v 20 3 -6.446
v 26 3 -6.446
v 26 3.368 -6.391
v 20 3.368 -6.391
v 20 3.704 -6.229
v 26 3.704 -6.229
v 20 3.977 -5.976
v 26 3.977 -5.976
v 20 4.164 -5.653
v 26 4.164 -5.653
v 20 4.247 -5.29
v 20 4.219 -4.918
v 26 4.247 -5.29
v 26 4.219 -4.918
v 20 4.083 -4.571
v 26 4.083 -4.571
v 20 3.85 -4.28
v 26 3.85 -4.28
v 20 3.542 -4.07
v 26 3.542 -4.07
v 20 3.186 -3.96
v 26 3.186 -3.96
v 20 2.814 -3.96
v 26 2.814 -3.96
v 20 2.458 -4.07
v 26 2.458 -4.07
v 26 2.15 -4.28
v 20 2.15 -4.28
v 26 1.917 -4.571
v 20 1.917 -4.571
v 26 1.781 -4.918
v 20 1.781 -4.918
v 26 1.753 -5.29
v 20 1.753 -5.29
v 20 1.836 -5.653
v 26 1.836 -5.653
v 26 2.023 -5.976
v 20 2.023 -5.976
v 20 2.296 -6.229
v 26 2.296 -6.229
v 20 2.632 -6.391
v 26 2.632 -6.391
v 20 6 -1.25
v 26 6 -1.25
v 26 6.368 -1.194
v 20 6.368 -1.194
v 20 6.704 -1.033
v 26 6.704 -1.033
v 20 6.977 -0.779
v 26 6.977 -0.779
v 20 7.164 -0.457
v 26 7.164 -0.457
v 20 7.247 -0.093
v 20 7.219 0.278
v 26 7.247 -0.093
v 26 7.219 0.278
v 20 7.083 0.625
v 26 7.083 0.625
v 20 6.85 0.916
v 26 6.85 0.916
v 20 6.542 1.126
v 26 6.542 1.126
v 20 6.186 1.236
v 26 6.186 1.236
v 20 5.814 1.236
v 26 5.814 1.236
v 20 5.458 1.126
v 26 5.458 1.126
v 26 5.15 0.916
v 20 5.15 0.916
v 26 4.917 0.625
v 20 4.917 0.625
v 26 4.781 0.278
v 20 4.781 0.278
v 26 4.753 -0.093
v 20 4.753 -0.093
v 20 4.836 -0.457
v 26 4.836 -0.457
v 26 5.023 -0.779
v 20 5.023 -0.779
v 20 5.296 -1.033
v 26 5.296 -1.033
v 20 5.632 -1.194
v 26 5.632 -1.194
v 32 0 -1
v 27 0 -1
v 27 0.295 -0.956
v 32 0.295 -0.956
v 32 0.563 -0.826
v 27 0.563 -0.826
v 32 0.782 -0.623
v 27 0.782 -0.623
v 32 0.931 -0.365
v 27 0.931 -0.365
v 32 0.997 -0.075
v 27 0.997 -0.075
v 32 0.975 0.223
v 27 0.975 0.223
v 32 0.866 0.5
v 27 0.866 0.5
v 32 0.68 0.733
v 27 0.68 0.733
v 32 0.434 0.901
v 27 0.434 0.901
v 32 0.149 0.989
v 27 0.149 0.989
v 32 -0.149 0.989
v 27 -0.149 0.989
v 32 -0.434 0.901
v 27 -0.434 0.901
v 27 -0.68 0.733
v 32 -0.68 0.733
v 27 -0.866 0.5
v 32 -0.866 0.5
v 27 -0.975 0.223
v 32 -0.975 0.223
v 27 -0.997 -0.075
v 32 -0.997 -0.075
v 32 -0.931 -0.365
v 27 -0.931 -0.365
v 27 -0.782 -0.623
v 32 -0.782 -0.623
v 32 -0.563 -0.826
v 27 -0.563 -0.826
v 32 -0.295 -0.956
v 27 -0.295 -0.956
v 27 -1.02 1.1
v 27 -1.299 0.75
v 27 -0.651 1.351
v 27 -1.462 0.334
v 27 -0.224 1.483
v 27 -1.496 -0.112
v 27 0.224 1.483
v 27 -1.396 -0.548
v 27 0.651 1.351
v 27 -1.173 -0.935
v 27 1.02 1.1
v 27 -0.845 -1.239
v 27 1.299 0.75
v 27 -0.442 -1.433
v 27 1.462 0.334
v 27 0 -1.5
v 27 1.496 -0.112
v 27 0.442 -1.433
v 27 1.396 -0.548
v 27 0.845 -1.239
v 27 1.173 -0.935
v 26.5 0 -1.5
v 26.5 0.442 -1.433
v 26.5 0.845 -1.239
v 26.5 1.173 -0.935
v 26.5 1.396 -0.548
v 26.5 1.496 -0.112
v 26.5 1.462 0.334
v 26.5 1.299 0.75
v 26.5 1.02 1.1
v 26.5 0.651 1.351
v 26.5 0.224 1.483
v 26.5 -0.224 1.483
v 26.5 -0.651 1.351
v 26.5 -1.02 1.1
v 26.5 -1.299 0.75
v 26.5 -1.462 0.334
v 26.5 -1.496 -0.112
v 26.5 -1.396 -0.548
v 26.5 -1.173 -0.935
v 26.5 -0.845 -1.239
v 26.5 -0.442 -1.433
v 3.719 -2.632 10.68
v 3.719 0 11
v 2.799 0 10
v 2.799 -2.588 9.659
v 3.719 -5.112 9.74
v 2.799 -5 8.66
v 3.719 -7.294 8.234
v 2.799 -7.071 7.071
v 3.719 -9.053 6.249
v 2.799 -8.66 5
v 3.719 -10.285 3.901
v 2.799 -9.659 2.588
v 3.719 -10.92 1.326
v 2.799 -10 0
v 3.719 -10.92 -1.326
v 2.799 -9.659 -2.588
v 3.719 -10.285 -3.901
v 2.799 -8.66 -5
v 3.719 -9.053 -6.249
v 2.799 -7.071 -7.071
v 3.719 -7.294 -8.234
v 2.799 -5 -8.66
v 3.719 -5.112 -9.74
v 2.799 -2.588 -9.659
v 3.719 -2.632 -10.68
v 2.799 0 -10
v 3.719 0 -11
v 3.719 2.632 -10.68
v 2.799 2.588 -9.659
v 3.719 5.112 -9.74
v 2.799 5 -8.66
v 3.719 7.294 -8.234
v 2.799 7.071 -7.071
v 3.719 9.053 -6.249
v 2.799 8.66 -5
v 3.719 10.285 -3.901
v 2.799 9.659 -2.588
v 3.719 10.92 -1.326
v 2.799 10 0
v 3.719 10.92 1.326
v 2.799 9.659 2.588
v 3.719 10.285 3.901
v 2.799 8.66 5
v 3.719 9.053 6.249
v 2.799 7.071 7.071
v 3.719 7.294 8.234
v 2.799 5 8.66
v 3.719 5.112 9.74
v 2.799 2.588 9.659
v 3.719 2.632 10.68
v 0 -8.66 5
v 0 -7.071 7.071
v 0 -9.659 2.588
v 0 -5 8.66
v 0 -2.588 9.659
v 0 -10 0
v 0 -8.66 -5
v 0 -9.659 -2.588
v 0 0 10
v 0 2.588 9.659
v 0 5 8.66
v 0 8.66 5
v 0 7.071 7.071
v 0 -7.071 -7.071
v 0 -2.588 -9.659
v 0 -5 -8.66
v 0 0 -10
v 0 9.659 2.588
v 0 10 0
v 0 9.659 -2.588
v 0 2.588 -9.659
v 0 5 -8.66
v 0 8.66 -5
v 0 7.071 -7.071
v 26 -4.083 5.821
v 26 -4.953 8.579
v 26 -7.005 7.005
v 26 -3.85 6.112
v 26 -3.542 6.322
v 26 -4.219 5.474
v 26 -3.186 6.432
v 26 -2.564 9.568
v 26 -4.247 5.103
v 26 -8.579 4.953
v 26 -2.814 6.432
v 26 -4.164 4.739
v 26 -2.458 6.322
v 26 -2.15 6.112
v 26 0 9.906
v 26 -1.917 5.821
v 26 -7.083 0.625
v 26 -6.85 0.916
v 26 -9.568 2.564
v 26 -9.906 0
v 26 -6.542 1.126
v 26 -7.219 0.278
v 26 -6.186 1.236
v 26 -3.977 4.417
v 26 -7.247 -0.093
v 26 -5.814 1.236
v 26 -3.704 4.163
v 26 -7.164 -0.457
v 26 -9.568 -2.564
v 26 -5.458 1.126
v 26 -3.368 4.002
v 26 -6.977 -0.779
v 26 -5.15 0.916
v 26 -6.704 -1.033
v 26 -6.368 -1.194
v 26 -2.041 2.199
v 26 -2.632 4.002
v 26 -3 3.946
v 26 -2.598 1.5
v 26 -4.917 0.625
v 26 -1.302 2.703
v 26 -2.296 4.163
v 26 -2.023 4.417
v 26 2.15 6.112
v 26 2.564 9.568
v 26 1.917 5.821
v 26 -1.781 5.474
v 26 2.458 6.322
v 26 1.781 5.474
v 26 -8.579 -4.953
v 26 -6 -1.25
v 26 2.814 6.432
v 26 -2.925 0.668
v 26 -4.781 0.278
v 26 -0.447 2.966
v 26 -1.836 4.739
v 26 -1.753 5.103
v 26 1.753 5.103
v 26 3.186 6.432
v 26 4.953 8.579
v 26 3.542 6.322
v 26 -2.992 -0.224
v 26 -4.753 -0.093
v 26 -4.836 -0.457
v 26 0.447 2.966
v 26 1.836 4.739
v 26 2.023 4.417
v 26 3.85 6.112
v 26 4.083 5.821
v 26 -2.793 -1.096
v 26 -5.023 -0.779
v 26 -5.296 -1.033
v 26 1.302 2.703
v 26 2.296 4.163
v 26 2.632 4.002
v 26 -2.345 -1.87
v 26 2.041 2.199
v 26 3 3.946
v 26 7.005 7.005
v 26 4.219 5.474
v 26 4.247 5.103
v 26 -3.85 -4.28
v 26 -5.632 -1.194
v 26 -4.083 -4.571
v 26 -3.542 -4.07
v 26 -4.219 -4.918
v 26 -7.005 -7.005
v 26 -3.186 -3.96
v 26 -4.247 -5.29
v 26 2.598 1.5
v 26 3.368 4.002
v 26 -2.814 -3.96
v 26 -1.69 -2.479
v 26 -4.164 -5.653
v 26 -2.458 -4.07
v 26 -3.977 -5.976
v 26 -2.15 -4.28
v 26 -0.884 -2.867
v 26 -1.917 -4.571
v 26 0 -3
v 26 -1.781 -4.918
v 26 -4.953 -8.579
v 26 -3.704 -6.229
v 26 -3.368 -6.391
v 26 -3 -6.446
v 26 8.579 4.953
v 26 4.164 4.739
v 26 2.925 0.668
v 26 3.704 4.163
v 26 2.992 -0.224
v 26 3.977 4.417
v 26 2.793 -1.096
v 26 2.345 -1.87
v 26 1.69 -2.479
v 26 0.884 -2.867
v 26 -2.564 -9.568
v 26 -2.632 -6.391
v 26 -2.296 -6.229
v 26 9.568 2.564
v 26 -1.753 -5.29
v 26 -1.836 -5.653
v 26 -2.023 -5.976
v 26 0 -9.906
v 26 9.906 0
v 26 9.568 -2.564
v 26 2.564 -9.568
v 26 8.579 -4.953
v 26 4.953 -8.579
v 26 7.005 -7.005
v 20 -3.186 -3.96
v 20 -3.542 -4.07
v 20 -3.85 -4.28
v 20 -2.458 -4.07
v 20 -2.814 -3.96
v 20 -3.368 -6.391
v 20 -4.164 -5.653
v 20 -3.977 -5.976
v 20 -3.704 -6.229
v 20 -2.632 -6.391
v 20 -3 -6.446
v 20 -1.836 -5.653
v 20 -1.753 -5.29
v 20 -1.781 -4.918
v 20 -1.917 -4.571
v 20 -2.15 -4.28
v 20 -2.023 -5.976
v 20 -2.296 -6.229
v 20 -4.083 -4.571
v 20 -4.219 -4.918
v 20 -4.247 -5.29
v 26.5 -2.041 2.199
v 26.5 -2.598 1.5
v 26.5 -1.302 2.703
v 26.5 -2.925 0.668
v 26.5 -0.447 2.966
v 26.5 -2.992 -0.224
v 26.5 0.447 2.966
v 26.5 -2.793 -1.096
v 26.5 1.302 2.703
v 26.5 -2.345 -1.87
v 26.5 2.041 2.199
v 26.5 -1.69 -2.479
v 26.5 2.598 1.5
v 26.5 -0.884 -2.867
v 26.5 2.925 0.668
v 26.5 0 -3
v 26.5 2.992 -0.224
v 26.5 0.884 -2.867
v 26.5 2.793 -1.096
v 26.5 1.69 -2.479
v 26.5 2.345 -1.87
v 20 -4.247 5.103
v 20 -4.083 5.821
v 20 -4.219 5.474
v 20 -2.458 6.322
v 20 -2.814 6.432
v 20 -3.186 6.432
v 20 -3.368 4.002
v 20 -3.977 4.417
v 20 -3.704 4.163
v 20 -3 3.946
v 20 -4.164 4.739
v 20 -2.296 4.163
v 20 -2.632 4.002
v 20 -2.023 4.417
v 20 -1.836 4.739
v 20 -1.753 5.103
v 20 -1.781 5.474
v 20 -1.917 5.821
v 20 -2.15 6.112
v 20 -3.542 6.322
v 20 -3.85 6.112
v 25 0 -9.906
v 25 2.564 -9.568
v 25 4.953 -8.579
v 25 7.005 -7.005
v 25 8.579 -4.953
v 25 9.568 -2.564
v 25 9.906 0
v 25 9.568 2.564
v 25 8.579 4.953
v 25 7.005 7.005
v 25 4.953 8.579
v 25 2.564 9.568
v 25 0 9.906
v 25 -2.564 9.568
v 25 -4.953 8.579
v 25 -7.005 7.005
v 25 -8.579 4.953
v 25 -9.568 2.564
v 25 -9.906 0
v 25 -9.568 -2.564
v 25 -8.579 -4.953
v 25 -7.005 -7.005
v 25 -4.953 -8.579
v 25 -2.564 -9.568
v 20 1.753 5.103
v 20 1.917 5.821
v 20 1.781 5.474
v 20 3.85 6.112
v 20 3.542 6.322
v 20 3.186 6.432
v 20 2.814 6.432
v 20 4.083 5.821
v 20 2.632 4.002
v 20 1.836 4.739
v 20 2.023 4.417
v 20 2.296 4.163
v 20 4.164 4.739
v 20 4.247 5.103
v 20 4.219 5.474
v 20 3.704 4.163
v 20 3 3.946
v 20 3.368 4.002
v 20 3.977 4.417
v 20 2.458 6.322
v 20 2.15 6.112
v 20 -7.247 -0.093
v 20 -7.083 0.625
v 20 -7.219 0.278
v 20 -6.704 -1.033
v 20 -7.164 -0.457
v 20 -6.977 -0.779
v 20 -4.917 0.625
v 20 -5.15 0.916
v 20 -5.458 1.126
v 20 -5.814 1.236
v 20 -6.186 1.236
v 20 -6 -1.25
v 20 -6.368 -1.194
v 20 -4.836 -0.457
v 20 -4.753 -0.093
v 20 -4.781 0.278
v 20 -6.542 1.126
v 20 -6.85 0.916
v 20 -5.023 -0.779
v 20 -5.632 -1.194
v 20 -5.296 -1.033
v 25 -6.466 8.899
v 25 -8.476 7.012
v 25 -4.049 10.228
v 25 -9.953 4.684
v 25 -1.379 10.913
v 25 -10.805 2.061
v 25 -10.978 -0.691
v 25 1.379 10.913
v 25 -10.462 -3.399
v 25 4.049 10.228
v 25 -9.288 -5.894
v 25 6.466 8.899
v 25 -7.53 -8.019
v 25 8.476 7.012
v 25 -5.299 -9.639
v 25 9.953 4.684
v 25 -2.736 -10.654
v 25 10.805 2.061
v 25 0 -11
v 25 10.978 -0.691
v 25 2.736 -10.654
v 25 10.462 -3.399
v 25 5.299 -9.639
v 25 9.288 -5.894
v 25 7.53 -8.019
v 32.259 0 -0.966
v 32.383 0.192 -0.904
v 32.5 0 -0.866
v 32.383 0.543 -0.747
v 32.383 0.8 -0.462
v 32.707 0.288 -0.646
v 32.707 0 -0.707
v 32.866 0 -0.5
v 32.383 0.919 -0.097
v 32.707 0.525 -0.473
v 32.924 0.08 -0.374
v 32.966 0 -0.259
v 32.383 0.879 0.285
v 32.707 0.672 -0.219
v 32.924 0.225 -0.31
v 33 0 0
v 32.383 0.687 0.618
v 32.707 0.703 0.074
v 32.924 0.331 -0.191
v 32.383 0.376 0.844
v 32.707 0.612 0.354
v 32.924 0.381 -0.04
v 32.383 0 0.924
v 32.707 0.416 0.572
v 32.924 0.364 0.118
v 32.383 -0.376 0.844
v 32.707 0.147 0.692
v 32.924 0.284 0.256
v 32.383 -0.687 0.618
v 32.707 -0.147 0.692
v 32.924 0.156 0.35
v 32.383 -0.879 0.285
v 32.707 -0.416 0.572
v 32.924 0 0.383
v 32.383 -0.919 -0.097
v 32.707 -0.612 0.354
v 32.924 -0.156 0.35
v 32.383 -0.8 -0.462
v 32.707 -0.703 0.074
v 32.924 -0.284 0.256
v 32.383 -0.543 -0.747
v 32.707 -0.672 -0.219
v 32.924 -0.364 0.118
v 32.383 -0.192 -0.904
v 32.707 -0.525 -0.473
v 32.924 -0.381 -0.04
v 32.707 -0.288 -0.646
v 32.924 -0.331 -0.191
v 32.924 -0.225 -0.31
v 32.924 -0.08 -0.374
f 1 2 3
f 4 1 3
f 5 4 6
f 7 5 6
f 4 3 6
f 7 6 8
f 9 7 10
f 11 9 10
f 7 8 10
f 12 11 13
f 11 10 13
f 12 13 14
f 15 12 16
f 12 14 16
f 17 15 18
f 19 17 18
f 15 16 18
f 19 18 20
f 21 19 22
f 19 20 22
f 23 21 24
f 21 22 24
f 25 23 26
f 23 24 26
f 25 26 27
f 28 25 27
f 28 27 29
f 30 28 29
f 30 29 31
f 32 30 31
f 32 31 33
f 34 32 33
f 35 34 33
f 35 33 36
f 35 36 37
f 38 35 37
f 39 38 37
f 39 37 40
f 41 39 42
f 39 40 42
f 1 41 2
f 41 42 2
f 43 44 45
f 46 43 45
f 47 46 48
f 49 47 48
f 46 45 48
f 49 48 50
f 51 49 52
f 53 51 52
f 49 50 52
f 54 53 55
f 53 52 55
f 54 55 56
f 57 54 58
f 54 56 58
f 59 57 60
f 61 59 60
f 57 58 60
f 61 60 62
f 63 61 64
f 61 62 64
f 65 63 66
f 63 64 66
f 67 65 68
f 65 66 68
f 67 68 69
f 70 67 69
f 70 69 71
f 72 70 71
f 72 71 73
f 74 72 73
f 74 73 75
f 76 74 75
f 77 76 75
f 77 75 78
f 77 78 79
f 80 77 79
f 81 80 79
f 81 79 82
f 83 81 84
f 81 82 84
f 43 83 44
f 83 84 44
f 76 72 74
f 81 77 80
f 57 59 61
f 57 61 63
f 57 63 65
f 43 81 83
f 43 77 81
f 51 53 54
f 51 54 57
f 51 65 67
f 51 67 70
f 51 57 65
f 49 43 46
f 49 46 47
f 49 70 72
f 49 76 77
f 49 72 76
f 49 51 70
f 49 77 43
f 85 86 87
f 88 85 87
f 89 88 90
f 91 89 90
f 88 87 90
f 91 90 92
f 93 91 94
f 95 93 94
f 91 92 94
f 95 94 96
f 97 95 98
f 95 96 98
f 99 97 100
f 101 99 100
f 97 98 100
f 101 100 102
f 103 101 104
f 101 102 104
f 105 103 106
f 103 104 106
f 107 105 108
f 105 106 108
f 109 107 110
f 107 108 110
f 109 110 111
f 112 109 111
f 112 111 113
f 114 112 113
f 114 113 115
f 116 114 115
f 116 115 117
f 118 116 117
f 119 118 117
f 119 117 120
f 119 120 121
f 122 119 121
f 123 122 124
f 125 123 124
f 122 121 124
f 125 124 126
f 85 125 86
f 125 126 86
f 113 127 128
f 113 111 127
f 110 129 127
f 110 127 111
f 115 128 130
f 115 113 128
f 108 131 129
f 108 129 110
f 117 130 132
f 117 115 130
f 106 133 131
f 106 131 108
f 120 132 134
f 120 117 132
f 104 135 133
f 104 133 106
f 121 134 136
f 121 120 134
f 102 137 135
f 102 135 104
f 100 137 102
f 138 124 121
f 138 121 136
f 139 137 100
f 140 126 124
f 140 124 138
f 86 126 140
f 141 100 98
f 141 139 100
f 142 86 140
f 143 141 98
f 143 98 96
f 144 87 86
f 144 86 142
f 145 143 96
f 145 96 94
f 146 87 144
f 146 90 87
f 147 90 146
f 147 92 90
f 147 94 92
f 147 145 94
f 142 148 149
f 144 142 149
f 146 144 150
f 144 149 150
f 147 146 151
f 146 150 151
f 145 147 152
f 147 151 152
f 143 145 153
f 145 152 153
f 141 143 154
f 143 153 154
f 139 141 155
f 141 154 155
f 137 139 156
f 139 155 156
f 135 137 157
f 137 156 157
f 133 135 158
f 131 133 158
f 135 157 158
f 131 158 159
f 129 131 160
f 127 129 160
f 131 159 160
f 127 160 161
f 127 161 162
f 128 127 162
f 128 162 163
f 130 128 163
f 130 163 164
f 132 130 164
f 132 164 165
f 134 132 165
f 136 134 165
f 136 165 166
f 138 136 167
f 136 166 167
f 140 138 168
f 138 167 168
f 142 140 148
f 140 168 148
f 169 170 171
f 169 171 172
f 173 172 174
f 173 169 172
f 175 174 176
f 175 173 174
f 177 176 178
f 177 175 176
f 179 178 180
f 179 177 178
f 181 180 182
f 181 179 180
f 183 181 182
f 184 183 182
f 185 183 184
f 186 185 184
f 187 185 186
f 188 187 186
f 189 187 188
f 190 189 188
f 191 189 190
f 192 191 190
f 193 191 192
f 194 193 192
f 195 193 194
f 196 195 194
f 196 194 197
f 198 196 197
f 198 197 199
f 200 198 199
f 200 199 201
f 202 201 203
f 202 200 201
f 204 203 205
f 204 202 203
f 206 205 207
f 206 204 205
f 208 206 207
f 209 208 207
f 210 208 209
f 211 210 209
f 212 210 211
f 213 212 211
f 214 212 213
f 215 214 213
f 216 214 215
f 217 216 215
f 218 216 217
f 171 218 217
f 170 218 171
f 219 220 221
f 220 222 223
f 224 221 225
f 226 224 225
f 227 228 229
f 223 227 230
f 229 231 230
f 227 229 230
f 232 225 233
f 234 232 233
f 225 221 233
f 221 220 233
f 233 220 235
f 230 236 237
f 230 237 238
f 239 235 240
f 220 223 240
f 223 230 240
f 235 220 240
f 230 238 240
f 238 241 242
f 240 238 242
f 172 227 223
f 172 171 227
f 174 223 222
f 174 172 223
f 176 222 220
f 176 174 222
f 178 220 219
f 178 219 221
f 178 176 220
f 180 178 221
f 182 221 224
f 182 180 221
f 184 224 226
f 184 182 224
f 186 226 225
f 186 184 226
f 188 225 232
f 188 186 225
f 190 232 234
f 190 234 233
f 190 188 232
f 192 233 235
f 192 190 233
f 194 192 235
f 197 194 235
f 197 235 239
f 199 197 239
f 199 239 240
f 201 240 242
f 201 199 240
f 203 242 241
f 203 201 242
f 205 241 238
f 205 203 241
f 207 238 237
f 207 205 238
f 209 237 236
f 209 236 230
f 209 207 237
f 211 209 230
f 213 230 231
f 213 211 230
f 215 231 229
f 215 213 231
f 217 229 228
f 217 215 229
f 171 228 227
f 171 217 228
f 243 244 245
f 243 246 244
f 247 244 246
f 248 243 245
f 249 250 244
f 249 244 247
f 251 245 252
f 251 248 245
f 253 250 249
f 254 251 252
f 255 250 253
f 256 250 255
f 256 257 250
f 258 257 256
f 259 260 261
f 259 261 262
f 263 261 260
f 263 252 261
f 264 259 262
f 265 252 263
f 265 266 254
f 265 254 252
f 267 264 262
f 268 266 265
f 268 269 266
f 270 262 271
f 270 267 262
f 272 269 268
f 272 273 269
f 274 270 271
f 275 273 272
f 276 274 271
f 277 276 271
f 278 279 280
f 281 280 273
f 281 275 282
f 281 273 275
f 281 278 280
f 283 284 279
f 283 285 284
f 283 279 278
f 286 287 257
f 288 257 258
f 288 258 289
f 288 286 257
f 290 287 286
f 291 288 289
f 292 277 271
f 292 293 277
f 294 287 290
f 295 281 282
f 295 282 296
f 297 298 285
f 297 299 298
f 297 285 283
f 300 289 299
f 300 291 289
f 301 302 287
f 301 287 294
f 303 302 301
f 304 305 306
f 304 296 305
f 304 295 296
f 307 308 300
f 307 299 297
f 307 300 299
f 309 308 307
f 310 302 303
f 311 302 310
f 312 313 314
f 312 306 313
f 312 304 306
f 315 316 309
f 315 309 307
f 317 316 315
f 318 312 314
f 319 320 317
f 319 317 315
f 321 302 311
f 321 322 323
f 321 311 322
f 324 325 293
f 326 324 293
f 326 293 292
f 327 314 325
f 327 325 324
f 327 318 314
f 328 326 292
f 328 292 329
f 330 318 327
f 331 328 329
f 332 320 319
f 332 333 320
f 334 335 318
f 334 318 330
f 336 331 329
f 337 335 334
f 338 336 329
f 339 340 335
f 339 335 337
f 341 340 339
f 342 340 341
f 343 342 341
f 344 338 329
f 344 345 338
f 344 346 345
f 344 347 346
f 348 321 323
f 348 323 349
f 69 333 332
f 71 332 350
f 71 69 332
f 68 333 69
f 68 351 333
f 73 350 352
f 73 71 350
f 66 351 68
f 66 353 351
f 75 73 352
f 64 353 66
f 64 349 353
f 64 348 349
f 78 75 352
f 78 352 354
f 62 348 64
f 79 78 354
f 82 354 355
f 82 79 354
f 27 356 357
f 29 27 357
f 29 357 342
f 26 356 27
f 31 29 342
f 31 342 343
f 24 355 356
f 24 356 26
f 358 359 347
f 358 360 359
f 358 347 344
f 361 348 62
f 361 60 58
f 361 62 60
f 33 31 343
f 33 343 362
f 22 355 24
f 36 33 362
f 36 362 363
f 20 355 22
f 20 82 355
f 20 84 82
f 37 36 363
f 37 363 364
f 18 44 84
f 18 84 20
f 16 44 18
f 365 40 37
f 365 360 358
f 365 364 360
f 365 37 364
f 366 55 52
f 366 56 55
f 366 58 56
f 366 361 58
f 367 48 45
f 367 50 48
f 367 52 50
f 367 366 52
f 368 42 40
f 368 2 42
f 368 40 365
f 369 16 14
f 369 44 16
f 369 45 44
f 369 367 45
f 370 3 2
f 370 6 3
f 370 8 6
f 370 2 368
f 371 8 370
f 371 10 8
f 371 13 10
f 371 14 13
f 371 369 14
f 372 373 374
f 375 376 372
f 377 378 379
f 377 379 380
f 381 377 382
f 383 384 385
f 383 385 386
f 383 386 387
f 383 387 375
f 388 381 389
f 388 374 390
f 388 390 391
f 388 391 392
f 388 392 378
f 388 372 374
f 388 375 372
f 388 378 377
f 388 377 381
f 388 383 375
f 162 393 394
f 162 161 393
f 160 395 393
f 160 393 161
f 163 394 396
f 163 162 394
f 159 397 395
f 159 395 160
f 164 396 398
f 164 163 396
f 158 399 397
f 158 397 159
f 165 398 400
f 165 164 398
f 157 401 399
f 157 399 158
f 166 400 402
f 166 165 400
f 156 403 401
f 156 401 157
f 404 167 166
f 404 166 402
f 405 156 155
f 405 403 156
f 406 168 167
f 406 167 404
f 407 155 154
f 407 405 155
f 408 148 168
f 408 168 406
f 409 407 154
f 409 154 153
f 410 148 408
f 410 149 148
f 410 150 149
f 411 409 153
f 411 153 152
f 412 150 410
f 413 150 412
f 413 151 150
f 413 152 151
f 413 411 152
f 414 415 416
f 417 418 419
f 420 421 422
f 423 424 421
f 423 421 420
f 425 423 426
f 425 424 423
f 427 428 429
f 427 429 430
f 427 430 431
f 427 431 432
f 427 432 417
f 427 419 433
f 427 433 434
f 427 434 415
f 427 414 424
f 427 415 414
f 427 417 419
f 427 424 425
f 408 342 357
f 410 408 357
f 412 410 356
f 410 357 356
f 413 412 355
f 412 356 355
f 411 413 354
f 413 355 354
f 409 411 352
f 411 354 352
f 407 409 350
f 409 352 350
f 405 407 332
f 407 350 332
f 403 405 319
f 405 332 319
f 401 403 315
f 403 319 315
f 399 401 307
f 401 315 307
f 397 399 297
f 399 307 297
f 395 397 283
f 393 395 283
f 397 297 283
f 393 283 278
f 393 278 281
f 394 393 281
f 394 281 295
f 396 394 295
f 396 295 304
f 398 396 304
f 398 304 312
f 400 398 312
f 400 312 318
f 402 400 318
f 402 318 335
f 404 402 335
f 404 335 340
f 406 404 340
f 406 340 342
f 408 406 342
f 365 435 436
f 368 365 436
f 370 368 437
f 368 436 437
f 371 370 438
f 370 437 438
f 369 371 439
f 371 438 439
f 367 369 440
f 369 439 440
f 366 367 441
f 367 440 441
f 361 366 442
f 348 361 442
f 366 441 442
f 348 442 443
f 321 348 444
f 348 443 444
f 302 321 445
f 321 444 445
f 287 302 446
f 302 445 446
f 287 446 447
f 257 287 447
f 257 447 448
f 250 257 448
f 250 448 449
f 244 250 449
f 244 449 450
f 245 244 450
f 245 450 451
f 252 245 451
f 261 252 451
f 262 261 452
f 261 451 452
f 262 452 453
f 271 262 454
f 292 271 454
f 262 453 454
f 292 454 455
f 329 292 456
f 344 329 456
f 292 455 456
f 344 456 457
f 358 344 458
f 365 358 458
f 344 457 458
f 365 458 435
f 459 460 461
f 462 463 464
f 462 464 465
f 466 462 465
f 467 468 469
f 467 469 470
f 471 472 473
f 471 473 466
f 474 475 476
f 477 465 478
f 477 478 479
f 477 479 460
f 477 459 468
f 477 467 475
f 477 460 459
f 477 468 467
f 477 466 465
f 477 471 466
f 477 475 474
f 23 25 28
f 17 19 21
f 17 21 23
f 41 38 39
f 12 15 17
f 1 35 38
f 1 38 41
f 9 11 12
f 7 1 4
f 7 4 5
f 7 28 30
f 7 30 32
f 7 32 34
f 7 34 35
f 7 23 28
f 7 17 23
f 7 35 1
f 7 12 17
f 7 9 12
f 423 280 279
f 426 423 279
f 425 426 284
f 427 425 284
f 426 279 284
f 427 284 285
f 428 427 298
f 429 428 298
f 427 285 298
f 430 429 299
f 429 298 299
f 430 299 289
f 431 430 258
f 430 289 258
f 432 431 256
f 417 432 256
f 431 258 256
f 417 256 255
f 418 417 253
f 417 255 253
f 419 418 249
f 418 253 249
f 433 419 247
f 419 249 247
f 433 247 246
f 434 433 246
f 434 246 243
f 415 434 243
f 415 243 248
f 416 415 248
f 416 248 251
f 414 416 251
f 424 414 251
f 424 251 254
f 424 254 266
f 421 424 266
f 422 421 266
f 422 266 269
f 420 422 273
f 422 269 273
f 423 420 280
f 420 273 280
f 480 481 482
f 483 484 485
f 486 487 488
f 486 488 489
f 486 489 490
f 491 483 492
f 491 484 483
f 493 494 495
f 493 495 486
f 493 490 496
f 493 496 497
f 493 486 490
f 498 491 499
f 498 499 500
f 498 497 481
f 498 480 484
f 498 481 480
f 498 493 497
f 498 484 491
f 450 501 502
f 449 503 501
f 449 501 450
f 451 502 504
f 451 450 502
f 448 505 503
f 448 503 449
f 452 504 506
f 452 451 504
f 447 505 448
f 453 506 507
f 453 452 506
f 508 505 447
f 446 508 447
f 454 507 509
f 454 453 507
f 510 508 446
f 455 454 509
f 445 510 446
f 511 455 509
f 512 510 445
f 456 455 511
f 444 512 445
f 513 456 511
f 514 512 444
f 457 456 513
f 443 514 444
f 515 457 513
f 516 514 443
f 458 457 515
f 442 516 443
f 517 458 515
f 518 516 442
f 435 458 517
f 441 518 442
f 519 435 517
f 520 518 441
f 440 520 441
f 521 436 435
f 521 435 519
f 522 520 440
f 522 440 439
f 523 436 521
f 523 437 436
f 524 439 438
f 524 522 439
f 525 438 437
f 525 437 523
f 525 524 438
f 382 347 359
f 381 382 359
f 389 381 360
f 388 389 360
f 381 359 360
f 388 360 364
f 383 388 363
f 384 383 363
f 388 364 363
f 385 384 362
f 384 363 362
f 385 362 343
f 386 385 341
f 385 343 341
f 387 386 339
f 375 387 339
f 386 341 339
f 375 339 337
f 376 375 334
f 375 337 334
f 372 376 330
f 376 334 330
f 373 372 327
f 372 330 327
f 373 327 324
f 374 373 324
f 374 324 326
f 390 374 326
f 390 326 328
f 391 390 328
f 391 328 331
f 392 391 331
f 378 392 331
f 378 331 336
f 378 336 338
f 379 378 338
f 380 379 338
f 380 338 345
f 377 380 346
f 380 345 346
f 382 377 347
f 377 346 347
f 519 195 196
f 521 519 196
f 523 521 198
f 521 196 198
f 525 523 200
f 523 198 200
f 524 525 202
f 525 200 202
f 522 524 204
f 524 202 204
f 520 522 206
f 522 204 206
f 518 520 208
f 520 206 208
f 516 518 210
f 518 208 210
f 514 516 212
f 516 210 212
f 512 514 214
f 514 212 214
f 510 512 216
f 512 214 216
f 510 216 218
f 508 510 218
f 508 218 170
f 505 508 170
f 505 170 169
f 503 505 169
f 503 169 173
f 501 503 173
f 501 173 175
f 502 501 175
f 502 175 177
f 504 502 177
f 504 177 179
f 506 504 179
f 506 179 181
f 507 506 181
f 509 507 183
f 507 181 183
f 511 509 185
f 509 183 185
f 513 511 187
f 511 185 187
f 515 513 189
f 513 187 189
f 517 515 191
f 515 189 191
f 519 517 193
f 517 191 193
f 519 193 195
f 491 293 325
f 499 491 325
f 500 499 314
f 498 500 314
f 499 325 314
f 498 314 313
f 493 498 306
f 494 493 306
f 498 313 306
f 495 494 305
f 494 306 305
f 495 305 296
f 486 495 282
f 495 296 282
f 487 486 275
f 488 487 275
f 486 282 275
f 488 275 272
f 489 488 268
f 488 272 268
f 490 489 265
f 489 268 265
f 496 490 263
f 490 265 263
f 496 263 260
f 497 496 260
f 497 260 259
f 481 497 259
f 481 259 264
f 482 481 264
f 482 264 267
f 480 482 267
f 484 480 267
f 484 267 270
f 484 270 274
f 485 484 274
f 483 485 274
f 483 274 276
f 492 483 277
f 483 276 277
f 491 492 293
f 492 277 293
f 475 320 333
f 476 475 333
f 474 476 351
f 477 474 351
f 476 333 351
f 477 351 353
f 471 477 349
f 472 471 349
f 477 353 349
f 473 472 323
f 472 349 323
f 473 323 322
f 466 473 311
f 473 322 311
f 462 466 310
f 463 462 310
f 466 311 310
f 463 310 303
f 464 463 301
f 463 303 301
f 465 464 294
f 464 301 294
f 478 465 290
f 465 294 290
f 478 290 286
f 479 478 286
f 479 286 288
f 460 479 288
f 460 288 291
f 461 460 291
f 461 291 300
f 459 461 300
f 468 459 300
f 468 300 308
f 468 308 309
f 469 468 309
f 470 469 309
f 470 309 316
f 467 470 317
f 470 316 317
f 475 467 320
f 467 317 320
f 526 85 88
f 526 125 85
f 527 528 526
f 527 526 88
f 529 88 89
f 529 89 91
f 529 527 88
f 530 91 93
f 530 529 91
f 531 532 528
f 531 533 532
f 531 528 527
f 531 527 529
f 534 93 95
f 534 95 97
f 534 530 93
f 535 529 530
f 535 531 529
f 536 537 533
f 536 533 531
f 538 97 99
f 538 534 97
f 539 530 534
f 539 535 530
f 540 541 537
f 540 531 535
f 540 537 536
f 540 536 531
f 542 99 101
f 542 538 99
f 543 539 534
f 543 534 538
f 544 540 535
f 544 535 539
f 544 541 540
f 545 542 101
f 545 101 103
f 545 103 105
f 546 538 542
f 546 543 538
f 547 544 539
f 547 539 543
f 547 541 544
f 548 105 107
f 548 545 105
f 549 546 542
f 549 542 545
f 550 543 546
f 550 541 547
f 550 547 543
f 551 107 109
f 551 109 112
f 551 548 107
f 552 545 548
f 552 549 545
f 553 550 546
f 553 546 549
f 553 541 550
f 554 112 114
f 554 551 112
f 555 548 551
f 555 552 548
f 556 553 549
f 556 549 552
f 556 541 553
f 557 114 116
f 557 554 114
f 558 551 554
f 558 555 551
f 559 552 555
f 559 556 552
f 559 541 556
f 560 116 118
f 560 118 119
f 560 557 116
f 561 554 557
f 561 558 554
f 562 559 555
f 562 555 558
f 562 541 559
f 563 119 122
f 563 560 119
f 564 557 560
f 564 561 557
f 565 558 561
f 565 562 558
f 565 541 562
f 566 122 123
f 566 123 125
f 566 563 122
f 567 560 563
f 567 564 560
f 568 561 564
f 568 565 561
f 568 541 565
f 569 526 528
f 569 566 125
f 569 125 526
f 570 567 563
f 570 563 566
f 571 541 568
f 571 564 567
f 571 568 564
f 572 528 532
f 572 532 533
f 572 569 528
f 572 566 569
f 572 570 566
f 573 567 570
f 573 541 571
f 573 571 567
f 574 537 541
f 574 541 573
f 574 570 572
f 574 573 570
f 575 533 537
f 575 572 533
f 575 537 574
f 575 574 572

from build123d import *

# Parameters (mm, degrees)
CROQUIS4_R              = 11
SALIENTE_EXTRUIR2_DEPTH = 25
CROQUIS5_R              = 3
SALIENTE_EXTRUIR3_DEPTH = 1.5
CROQUIS6_R              = 1.5
SALIENTE_EXTRUIR4_DEPTH = 0.5
CROQUIS7_R              = 1
SALIENTE_EXTRUIR5_DEPTH = 6
REDONDEO1_R             = 1
CROQUIS10_R             = 9.905946753
SALIENTE_EXTRUIR6_DEPTH = 1
CORTAR_EXTRUIR1_START   = 1
CROQUIS8_R              = 1.25
CORTAR_EXTRUIR1_DEPTH   = 6


with BuildPart() as part:
    # Croquis4 → Saliente-Extruir2 (new body)
    with BuildSketch(Plane(origin=(0, 0, 0), x_dir=(0, 0, -1), z_dir=(1, 0, 0))):
        Circle(CROQUIS4_R)
    extrude(amount=SALIENTE_EXTRUIR2_DEPTH)

    # Croquis5 → Saliente-Extruir3 (add)
    with BuildSketch(Plane(origin=(25, 0, 0), x_dir=(0, 0, -1), z_dir=(1, 0, 0))):
        Circle(CROQUIS5_R)
    extrude(amount=SALIENTE_EXTRUIR3_DEPTH)

    # Croquis6 → Saliente-Extruir4 (add)
    with BuildSketch(Plane(origin=(26.5, 0, 0), x_dir=(0, 0, -1), z_dir=(1, 0, 0))):
        Circle(CROQUIS6_R)
    extrude(amount=SALIENTE_EXTRUIR4_DEPTH)

    # Croquis7 → Saliente-Extruir5 (add)
    with BuildSketch(Plane(origin=(27, 0, 0), x_dir=(0, 0, -1), z_dir=(1, 0, 0))):
        Circle(CROQUIS7_R)
    extrude(amount=SALIENTE_EXTRUIR5_DEPTH)

    # Redondeo1
    redondeo1_edges = [part.edges().sort_by_distance(p)[0] for p in [
        (33, 0, 1),
    ]]
    fillet(redondeo1_edges, radius=REDONDEO1_R)

    # Croquis10 → Saliente-Extruir6 (add)
    with BuildSketch(Plane(origin=(25, 0, 0), x_dir=(0, 0, -1), z_dir=(1, 0, 0))):
        Circle(CROQUIS10_R)
    extrude(amount=SALIENTE_EXTRUIR6_DEPTH)

    # Croquis9 → Cortar-Revolución2 (revolve, cut)
    with BuildSketch(Plane.XY, mode=Mode.PRIVATE) as cortar_revoluci_n2_sk:
        Polygon((3.71935431, 11), (0, 11), (0, 10), (2.798724642, 10), align=None)
    revolve(cortar_revoluci_n2_sk.sketch.rotate(Axis((0, 0, 0), (1, 0, 0)), 90), axis=Axis((0, 0, 0), (1, 0, 0)), mode=Mode.SUBTRACT)

    # Croquis8 → Cortar-Extruir1 (cut)
    with BuildSketch(Plane(origin=(25, 0, 0), x_dir=(0, 0, -1), z_dir=(1, 0, 0)).offset(CORTAR_EXTRUIR1_START)):
        with Locations((0, 6)):
            Circle(CROQUIS8_R)
        with Locations((5.196152423, 3)):
            Circle(CROQUIS8_R)
        with Locations((5.196152423, -3)):
            Circle(CROQUIS8_R)
        with Locations((0, -6)):
            Circle(CROQUIS8_R)
        with Locations((-5.196152423, -3)):
            Circle(CROQUIS8_R)
        with Locations((-5.196152423, 3)):
            Circle(CROQUIS8_R)
    extrude(amount=-CORTAR_EXTRUIR1_DEPTH, mode=Mode.SUBTRACT)


solid = part.part
